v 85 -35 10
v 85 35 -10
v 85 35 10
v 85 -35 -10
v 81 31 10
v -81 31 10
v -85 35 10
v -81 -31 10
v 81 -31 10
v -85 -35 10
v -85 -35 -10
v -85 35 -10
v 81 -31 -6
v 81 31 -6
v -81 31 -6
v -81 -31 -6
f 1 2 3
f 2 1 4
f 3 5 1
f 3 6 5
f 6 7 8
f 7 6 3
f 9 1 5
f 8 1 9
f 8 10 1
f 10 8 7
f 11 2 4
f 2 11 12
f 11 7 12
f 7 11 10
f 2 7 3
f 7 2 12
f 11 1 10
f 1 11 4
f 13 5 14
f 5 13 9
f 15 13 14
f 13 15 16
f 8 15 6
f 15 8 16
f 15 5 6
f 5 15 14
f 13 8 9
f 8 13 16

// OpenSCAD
// ========================================
// a 170 x 70 x 20 mm enclosure with 4 mm wall thickness
// NeuroCAD canonical IR; dimensions are millimetres
// ========================================
$fn = 48;

difference() {
  cube(size=[170, 70, 20], center=true);
  translate([0, 0, 2.1]) {
    cube(size=[162, 62, 16.2], center=true);
  }
}
